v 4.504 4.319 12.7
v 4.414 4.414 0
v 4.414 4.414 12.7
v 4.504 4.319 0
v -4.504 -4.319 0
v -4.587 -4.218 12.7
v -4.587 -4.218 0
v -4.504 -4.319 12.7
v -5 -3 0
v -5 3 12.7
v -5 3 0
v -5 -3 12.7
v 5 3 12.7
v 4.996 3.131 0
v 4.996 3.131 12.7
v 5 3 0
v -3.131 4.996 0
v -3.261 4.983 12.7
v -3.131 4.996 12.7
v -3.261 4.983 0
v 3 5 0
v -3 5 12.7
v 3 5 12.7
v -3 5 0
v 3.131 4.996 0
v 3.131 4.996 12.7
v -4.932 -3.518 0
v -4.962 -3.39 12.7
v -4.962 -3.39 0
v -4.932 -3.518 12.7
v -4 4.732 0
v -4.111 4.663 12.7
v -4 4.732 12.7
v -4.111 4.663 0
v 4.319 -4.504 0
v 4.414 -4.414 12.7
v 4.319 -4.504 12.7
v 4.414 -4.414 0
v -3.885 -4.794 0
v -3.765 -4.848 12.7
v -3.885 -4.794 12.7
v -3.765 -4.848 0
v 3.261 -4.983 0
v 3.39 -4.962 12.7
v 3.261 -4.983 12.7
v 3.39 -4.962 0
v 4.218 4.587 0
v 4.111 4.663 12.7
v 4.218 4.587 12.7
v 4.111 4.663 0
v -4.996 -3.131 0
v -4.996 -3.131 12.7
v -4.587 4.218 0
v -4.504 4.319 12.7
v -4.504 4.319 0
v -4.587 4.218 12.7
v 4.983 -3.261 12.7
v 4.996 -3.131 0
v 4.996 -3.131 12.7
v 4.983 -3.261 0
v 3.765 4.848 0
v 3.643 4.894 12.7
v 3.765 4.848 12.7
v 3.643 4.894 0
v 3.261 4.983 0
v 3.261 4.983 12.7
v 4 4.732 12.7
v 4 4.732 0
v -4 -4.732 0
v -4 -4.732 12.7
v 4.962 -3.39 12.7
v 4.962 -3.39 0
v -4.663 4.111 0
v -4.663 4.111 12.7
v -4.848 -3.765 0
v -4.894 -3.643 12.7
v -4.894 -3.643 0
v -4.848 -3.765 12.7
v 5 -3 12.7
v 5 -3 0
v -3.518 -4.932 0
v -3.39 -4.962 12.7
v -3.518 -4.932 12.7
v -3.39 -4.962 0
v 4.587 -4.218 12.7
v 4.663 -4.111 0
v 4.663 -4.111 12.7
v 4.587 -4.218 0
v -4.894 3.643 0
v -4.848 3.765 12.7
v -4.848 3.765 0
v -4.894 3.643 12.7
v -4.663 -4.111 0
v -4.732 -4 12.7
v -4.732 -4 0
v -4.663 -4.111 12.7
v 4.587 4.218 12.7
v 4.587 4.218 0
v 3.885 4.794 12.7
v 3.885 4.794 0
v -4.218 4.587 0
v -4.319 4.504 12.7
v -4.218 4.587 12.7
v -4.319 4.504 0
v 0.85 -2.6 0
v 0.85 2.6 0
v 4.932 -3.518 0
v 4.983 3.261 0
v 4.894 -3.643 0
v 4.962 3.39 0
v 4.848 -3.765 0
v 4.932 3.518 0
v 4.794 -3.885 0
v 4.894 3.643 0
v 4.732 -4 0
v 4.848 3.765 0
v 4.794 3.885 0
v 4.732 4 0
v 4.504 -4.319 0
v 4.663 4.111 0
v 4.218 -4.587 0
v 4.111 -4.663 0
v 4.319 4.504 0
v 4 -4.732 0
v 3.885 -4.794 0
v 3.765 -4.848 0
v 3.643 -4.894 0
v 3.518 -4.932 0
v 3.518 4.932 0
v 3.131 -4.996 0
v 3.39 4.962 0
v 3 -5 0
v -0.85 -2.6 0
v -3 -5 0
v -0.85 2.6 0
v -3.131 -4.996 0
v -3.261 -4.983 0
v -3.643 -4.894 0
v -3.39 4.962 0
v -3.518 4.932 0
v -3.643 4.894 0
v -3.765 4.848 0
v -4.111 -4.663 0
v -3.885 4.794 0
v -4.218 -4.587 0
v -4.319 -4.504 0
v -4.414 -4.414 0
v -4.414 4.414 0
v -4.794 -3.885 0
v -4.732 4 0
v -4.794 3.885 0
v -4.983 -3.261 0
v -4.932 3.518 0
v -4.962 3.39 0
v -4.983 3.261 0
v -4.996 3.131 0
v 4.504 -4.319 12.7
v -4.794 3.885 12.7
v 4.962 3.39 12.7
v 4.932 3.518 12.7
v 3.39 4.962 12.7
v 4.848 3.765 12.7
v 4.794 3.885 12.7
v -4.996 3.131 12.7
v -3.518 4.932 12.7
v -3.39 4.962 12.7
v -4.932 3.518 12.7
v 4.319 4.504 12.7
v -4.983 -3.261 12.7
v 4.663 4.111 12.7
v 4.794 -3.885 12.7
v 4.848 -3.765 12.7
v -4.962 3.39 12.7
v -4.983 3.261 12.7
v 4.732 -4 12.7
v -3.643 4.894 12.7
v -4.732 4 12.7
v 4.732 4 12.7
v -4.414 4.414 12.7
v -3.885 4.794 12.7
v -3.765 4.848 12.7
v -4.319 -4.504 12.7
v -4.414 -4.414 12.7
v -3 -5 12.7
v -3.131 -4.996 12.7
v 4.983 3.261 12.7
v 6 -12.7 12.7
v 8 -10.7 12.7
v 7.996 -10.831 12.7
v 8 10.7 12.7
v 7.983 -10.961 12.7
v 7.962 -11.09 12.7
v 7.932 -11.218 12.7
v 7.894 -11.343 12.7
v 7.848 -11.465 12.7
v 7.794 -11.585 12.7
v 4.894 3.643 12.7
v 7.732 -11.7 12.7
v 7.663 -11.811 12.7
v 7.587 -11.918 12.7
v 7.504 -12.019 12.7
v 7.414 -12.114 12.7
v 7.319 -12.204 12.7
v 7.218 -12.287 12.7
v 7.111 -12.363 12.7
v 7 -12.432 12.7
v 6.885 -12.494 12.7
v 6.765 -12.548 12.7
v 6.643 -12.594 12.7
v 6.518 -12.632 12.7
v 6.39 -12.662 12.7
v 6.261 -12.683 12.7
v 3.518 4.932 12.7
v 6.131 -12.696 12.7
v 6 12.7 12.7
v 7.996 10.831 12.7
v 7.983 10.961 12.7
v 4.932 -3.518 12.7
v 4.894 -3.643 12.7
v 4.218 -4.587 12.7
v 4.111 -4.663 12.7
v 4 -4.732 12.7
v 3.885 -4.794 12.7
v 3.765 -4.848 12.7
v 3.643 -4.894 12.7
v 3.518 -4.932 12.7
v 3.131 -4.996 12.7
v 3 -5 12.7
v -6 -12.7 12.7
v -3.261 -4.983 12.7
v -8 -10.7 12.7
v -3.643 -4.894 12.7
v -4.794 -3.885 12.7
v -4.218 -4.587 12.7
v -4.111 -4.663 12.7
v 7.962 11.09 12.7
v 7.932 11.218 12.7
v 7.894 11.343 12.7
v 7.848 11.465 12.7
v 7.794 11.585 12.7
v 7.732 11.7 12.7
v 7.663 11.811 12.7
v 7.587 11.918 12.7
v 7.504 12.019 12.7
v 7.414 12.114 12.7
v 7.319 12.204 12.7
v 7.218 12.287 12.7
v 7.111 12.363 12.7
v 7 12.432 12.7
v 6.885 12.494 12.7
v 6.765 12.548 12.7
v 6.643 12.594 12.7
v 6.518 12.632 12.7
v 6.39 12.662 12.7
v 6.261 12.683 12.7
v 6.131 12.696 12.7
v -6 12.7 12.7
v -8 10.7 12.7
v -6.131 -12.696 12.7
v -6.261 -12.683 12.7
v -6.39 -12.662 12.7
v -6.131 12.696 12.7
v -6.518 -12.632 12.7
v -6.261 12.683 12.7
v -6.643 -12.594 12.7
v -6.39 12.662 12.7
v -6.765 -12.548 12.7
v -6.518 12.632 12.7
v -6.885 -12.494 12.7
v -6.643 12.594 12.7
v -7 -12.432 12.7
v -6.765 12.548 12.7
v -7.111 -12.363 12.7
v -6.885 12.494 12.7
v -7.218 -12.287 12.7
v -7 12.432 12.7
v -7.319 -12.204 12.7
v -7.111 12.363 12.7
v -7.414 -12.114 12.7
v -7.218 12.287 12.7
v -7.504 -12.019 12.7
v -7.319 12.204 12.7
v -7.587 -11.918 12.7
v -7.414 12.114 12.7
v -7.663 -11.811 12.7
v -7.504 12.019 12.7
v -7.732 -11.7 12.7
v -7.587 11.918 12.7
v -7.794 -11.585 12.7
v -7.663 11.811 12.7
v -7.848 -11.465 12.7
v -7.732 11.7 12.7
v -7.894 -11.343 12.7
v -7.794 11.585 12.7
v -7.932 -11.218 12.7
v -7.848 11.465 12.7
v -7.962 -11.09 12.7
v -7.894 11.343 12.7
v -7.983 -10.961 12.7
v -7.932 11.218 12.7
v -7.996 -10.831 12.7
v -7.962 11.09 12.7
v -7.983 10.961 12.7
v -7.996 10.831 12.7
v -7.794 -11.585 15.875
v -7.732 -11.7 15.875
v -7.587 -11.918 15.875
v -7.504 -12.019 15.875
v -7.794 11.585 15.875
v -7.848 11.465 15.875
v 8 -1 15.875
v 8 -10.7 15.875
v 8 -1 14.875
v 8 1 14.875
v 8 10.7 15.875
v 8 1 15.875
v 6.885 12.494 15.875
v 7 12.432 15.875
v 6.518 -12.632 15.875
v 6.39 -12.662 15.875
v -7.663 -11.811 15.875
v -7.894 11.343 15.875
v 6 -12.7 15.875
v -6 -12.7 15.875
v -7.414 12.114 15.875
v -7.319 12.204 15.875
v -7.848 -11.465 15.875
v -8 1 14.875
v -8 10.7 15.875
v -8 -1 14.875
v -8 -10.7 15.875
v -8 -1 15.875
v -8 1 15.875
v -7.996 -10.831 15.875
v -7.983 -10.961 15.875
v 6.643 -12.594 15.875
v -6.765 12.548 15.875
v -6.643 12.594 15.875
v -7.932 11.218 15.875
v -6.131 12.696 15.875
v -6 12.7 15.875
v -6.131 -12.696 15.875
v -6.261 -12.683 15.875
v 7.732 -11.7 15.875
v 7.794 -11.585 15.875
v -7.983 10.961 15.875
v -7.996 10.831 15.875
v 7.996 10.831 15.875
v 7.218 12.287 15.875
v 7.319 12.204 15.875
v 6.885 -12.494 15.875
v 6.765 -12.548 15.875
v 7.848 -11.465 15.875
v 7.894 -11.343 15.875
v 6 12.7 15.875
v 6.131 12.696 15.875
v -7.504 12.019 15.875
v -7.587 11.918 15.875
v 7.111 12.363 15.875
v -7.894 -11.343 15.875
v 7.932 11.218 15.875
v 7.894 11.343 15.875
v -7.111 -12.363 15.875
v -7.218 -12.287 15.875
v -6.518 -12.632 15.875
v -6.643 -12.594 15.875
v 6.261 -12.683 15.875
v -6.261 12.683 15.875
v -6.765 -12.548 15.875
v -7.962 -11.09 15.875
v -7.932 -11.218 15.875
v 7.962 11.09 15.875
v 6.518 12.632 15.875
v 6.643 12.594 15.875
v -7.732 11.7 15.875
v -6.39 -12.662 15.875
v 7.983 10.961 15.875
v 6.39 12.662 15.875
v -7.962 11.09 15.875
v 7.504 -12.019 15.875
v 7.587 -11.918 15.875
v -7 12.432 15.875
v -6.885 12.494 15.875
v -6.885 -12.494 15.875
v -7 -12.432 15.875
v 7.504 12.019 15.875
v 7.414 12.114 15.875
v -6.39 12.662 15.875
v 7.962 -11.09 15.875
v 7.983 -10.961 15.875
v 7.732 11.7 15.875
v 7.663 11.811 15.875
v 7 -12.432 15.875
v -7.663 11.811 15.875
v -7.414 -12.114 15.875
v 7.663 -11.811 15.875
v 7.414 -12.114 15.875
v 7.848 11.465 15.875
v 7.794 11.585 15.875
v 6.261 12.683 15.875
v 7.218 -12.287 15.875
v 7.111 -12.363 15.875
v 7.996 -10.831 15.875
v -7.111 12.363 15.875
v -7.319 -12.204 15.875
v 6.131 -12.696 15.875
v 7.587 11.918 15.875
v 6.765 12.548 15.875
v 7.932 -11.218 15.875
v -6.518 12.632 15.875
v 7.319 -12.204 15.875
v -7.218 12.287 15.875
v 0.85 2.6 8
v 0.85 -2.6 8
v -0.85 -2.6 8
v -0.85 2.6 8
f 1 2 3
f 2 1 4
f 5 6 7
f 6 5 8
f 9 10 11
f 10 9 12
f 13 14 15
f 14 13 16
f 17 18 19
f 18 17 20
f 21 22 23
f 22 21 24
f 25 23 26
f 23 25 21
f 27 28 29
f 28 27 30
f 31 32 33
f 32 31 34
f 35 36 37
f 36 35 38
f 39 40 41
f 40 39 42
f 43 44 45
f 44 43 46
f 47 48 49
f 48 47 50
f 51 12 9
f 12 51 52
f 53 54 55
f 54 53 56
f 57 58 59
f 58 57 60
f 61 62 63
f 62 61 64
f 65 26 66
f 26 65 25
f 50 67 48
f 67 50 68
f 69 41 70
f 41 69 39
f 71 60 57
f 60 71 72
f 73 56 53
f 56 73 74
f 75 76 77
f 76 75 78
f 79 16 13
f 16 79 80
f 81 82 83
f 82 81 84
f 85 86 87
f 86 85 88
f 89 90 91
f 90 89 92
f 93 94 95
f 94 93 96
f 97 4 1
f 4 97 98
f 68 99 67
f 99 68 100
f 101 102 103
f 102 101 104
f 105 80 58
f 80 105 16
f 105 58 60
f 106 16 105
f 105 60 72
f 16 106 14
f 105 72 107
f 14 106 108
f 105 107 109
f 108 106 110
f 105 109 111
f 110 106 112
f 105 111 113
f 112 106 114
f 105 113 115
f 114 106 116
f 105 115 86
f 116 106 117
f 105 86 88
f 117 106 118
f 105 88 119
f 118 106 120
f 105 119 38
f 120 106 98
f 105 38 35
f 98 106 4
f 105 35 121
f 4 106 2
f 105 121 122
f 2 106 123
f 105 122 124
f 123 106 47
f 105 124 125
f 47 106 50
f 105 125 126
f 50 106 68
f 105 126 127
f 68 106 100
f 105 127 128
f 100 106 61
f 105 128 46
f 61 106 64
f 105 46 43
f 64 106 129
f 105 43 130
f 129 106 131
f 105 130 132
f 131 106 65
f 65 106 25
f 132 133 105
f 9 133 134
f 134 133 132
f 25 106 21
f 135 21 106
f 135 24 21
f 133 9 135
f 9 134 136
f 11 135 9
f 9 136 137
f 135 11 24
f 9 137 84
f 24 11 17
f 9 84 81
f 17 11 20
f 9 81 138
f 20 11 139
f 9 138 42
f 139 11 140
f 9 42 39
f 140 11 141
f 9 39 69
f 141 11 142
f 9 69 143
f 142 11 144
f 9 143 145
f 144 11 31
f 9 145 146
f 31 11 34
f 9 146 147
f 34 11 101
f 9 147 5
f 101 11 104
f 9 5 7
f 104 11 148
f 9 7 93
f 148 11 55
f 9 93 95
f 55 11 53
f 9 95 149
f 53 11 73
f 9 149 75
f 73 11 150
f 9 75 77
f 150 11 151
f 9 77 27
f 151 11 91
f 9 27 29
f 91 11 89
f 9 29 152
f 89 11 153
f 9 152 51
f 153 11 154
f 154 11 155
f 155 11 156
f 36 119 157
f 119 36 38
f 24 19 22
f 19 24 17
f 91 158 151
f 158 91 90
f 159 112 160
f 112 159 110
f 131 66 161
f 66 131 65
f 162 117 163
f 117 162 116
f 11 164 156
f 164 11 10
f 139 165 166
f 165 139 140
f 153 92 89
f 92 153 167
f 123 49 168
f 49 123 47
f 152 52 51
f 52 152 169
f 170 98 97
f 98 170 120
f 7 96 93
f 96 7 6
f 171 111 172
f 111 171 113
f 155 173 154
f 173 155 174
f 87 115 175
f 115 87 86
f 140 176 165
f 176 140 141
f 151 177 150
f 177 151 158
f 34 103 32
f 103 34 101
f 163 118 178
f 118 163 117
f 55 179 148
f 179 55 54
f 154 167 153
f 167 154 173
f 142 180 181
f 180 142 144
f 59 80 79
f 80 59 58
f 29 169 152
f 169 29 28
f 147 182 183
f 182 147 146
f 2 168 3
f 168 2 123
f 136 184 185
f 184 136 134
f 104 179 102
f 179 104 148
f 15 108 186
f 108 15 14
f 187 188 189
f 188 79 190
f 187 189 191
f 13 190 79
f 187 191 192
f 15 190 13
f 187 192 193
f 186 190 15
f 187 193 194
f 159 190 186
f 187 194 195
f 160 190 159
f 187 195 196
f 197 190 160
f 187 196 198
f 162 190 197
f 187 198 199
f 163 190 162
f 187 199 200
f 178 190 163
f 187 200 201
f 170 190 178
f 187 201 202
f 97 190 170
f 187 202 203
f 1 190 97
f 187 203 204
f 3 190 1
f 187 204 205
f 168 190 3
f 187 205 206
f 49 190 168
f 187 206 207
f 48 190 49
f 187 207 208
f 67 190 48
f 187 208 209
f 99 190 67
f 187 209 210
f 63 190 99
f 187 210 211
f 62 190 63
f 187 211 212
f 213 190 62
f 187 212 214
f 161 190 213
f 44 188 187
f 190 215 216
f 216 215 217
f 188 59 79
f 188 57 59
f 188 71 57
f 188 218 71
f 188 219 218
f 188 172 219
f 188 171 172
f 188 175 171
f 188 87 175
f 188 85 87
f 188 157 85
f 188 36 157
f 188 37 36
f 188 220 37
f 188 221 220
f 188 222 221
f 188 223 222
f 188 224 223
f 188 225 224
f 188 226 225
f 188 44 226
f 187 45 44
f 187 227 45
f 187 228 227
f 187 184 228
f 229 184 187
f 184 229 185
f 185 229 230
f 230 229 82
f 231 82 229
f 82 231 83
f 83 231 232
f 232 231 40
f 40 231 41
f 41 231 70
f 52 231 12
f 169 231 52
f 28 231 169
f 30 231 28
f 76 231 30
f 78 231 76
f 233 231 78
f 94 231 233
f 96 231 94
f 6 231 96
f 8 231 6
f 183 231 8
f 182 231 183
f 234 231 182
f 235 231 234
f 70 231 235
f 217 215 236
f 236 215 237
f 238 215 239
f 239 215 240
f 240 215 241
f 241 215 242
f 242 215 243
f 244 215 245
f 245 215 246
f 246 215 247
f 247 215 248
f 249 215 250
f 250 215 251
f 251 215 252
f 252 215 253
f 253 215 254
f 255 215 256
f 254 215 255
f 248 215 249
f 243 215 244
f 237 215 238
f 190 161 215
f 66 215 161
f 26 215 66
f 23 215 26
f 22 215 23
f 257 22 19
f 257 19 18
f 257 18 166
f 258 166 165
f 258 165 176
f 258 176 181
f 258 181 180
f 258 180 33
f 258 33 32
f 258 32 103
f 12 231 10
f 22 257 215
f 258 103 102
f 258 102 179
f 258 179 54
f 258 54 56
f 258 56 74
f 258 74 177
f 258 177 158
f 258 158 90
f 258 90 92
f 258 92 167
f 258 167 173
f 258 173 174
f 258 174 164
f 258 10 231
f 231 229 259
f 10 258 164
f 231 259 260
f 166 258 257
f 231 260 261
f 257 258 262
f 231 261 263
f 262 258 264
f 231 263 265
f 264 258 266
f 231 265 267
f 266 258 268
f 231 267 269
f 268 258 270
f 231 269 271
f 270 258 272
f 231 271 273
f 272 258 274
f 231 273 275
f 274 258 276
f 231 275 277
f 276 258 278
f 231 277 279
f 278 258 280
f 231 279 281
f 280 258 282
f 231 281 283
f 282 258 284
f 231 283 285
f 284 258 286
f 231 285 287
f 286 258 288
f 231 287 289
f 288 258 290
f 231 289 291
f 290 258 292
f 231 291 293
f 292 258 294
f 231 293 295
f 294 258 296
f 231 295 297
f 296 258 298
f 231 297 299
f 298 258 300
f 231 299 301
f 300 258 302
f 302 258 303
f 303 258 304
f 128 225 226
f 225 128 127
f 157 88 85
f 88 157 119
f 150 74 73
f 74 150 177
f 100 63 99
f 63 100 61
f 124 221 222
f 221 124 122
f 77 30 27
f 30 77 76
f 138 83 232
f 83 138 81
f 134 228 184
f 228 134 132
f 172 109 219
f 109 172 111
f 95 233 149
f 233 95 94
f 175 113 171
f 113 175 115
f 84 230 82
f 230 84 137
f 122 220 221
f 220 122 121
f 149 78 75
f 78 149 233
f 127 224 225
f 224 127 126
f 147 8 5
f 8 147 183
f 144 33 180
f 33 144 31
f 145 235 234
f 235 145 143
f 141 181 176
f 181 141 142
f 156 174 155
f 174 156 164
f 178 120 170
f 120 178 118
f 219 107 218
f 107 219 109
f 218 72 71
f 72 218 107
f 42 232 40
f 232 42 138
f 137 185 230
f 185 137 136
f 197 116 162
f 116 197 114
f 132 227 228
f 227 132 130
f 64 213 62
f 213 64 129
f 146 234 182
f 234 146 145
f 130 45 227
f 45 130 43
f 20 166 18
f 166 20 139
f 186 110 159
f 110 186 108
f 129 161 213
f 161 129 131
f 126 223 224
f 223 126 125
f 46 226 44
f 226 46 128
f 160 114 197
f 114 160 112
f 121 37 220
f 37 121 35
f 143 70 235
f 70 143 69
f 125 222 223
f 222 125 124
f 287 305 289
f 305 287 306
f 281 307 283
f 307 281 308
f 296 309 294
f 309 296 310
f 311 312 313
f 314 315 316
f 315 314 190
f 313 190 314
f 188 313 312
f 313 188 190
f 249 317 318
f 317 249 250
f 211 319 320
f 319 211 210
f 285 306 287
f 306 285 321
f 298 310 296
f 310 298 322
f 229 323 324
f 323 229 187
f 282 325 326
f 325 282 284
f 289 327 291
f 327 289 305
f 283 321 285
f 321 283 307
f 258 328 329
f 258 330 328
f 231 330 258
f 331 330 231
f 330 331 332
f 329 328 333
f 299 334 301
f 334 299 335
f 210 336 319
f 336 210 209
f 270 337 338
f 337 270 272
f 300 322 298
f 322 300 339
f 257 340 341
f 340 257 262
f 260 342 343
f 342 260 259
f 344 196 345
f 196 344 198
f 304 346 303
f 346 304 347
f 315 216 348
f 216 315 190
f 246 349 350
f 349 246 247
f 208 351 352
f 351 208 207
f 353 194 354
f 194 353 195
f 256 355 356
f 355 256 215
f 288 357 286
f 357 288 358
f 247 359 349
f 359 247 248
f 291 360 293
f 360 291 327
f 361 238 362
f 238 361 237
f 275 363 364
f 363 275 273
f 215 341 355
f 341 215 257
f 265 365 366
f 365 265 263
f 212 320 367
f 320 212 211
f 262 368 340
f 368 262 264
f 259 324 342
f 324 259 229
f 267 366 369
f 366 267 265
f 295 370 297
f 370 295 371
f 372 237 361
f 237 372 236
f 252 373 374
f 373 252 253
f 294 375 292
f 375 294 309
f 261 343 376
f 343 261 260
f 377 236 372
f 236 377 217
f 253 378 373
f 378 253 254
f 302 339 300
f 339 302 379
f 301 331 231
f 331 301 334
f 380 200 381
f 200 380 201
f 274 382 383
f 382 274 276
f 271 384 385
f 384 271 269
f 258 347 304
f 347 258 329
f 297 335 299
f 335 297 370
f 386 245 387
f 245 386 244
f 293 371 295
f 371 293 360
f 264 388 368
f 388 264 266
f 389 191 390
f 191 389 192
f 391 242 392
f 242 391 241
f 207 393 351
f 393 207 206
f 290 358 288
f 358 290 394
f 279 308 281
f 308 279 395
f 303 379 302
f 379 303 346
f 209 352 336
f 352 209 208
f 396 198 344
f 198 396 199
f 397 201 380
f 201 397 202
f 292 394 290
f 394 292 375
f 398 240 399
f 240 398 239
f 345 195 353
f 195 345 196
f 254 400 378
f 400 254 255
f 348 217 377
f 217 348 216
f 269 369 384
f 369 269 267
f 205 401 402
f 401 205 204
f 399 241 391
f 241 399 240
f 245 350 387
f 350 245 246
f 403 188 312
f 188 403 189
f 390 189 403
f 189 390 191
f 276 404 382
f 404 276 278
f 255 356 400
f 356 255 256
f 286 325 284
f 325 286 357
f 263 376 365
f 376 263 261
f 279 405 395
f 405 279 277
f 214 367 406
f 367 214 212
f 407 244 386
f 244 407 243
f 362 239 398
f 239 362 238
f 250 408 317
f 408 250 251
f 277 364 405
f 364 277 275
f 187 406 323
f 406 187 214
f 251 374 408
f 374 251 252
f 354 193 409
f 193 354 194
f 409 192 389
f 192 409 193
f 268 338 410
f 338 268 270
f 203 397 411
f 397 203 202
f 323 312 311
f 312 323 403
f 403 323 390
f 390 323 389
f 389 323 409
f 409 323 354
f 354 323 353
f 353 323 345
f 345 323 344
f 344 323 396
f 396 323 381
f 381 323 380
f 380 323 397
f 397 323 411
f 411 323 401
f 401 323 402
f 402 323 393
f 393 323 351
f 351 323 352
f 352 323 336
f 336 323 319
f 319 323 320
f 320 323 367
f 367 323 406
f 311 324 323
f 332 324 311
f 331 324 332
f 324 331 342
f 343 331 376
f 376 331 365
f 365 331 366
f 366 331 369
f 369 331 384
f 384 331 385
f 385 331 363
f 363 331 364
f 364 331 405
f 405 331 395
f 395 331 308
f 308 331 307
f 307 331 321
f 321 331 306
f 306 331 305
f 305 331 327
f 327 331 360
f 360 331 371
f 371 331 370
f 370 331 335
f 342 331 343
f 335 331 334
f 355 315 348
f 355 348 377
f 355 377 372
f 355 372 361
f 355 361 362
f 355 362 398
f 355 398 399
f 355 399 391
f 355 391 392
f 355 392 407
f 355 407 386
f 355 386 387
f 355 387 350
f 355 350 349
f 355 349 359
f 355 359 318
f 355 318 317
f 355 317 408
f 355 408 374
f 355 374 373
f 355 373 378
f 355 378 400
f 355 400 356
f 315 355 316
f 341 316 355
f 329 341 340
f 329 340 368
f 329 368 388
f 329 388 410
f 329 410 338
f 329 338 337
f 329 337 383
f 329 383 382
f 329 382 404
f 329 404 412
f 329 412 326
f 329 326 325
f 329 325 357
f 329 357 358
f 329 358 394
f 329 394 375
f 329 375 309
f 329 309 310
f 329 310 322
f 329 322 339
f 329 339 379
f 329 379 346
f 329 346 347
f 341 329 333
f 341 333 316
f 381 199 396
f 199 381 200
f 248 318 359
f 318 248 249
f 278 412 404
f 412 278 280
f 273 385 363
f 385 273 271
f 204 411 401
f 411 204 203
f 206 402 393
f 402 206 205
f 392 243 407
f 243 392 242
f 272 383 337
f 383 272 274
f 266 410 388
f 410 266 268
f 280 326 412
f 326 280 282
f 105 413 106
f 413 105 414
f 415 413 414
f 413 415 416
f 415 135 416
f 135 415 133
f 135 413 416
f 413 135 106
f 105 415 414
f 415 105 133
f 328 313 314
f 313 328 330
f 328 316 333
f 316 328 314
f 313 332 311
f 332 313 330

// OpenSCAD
// ===========================================================================
//  cYbErDeCk v2 - fader_cap.scad
//  The NeoSlider's cap. Same logic as the knob: a plug that fills the slab's
//  slot, with only its top proud.
//
//      openscad -D 'part="3d"' -o export/stl/fader_cap.stl v2/cad/fader_cap.scad
//
//  It is the LAST part fitted (v2/parts/stack.md 6.2 step 12), which is what
//  lets it be wider than the shank's own travel window: it never has to pass
//  through the slot, it drops onto the shank from above once the slab is on.
//
//  PRINT IT CAP DOWN, for the knob's reasons: the top face is the only one
//  anyone looks at, and inverted there is no overhang anywhere.
// ===========================================================================

include <parameters.scad>
use <lib/util.scad>

part = "3d";

fc_plug   = acrylic_t;                  // 12.700, inside the slot
fc_proud  = 3.175;                      // [DESIGN] 0.125 in. HALF the knob's
                                        //   6.350, because a fader is pushed
                                        //   along and a knob is turned: the
                                        //   cap wants a low, wide purchase and
                                        //   the knob wants a tall rim.
fc_cap_w  = slider_slot_w + 2*2.000;    // [DERIVED] 16.000, overhanging the
                                        //   slot by 2.000 each side the way
                                        //   the knob's brim overhangs its bore
fc_cap_l  = 25.400;                     // [DESIGN] 1 in along the travel

//  The shank, measured: 5.000 wide, 1.786 thick, tip 15.500 above the board's
//  front face. With the board's rear on the wiring plane that puts the tip at
//  17.070, which is 7.545 above the acrylic's underside.
fc_grip_w = slider_shank + 0.200;       // [DESIGN] 5.200
fc_grip_t = 1.700;                      // [DESIGN] 0.086 UNDER the measured
                                        //   1.786, so the blade is an
                                        //   interference fit. There is no room
                                        //   for a set screw -- the shank tip
                                        //   stops 5.155 below the deck's top
                                        //   face -- so the grip is the fit.
fc_grip_h = 8.000;                      // [DESIGN] over the shank's 7.545

module fader_cap_3d() {
    difference() {
        union() {
            //  The plug is SQUARE on the cap's width, not the slot's
            //  length. Drawn the length of the slot it fills the slot, and a
            //  fader that fills its slot does not move -- the first cut of
            //  this file was 50.000 long against a 40.000 travel.
            //  slider_slot_l is travel + cap + 2.000, so the cap is
            //  slider_cap_w in BOTH axes and the travel is what is left.
            rbox(slider_cap_w, slider_cap_w, fc_plug, corner_r);
            translate([0, 0, fc_plug])
                rbox(fc_cap_w, fc_cap_l, fc_proud, corner_r);
        }
        //  the shank slot, up from the underside
        translate([-fc_grip_t/2, -fc_grip_w/2, -1])
            cube([fc_grip_t, fc_grip_w, fc_grip_h + 1]);
        //  one groove across the top, the same legend the knobs carry
        translate([-fc_cap_w/2, -knob_mark[0]/2,
                   fc_plug + fc_proud - knob_mark[1]])
            cube([fc_cap_w, knob_mark[0], knob_mark[1] + 1]);
    }
}

fader_cap_3d();
